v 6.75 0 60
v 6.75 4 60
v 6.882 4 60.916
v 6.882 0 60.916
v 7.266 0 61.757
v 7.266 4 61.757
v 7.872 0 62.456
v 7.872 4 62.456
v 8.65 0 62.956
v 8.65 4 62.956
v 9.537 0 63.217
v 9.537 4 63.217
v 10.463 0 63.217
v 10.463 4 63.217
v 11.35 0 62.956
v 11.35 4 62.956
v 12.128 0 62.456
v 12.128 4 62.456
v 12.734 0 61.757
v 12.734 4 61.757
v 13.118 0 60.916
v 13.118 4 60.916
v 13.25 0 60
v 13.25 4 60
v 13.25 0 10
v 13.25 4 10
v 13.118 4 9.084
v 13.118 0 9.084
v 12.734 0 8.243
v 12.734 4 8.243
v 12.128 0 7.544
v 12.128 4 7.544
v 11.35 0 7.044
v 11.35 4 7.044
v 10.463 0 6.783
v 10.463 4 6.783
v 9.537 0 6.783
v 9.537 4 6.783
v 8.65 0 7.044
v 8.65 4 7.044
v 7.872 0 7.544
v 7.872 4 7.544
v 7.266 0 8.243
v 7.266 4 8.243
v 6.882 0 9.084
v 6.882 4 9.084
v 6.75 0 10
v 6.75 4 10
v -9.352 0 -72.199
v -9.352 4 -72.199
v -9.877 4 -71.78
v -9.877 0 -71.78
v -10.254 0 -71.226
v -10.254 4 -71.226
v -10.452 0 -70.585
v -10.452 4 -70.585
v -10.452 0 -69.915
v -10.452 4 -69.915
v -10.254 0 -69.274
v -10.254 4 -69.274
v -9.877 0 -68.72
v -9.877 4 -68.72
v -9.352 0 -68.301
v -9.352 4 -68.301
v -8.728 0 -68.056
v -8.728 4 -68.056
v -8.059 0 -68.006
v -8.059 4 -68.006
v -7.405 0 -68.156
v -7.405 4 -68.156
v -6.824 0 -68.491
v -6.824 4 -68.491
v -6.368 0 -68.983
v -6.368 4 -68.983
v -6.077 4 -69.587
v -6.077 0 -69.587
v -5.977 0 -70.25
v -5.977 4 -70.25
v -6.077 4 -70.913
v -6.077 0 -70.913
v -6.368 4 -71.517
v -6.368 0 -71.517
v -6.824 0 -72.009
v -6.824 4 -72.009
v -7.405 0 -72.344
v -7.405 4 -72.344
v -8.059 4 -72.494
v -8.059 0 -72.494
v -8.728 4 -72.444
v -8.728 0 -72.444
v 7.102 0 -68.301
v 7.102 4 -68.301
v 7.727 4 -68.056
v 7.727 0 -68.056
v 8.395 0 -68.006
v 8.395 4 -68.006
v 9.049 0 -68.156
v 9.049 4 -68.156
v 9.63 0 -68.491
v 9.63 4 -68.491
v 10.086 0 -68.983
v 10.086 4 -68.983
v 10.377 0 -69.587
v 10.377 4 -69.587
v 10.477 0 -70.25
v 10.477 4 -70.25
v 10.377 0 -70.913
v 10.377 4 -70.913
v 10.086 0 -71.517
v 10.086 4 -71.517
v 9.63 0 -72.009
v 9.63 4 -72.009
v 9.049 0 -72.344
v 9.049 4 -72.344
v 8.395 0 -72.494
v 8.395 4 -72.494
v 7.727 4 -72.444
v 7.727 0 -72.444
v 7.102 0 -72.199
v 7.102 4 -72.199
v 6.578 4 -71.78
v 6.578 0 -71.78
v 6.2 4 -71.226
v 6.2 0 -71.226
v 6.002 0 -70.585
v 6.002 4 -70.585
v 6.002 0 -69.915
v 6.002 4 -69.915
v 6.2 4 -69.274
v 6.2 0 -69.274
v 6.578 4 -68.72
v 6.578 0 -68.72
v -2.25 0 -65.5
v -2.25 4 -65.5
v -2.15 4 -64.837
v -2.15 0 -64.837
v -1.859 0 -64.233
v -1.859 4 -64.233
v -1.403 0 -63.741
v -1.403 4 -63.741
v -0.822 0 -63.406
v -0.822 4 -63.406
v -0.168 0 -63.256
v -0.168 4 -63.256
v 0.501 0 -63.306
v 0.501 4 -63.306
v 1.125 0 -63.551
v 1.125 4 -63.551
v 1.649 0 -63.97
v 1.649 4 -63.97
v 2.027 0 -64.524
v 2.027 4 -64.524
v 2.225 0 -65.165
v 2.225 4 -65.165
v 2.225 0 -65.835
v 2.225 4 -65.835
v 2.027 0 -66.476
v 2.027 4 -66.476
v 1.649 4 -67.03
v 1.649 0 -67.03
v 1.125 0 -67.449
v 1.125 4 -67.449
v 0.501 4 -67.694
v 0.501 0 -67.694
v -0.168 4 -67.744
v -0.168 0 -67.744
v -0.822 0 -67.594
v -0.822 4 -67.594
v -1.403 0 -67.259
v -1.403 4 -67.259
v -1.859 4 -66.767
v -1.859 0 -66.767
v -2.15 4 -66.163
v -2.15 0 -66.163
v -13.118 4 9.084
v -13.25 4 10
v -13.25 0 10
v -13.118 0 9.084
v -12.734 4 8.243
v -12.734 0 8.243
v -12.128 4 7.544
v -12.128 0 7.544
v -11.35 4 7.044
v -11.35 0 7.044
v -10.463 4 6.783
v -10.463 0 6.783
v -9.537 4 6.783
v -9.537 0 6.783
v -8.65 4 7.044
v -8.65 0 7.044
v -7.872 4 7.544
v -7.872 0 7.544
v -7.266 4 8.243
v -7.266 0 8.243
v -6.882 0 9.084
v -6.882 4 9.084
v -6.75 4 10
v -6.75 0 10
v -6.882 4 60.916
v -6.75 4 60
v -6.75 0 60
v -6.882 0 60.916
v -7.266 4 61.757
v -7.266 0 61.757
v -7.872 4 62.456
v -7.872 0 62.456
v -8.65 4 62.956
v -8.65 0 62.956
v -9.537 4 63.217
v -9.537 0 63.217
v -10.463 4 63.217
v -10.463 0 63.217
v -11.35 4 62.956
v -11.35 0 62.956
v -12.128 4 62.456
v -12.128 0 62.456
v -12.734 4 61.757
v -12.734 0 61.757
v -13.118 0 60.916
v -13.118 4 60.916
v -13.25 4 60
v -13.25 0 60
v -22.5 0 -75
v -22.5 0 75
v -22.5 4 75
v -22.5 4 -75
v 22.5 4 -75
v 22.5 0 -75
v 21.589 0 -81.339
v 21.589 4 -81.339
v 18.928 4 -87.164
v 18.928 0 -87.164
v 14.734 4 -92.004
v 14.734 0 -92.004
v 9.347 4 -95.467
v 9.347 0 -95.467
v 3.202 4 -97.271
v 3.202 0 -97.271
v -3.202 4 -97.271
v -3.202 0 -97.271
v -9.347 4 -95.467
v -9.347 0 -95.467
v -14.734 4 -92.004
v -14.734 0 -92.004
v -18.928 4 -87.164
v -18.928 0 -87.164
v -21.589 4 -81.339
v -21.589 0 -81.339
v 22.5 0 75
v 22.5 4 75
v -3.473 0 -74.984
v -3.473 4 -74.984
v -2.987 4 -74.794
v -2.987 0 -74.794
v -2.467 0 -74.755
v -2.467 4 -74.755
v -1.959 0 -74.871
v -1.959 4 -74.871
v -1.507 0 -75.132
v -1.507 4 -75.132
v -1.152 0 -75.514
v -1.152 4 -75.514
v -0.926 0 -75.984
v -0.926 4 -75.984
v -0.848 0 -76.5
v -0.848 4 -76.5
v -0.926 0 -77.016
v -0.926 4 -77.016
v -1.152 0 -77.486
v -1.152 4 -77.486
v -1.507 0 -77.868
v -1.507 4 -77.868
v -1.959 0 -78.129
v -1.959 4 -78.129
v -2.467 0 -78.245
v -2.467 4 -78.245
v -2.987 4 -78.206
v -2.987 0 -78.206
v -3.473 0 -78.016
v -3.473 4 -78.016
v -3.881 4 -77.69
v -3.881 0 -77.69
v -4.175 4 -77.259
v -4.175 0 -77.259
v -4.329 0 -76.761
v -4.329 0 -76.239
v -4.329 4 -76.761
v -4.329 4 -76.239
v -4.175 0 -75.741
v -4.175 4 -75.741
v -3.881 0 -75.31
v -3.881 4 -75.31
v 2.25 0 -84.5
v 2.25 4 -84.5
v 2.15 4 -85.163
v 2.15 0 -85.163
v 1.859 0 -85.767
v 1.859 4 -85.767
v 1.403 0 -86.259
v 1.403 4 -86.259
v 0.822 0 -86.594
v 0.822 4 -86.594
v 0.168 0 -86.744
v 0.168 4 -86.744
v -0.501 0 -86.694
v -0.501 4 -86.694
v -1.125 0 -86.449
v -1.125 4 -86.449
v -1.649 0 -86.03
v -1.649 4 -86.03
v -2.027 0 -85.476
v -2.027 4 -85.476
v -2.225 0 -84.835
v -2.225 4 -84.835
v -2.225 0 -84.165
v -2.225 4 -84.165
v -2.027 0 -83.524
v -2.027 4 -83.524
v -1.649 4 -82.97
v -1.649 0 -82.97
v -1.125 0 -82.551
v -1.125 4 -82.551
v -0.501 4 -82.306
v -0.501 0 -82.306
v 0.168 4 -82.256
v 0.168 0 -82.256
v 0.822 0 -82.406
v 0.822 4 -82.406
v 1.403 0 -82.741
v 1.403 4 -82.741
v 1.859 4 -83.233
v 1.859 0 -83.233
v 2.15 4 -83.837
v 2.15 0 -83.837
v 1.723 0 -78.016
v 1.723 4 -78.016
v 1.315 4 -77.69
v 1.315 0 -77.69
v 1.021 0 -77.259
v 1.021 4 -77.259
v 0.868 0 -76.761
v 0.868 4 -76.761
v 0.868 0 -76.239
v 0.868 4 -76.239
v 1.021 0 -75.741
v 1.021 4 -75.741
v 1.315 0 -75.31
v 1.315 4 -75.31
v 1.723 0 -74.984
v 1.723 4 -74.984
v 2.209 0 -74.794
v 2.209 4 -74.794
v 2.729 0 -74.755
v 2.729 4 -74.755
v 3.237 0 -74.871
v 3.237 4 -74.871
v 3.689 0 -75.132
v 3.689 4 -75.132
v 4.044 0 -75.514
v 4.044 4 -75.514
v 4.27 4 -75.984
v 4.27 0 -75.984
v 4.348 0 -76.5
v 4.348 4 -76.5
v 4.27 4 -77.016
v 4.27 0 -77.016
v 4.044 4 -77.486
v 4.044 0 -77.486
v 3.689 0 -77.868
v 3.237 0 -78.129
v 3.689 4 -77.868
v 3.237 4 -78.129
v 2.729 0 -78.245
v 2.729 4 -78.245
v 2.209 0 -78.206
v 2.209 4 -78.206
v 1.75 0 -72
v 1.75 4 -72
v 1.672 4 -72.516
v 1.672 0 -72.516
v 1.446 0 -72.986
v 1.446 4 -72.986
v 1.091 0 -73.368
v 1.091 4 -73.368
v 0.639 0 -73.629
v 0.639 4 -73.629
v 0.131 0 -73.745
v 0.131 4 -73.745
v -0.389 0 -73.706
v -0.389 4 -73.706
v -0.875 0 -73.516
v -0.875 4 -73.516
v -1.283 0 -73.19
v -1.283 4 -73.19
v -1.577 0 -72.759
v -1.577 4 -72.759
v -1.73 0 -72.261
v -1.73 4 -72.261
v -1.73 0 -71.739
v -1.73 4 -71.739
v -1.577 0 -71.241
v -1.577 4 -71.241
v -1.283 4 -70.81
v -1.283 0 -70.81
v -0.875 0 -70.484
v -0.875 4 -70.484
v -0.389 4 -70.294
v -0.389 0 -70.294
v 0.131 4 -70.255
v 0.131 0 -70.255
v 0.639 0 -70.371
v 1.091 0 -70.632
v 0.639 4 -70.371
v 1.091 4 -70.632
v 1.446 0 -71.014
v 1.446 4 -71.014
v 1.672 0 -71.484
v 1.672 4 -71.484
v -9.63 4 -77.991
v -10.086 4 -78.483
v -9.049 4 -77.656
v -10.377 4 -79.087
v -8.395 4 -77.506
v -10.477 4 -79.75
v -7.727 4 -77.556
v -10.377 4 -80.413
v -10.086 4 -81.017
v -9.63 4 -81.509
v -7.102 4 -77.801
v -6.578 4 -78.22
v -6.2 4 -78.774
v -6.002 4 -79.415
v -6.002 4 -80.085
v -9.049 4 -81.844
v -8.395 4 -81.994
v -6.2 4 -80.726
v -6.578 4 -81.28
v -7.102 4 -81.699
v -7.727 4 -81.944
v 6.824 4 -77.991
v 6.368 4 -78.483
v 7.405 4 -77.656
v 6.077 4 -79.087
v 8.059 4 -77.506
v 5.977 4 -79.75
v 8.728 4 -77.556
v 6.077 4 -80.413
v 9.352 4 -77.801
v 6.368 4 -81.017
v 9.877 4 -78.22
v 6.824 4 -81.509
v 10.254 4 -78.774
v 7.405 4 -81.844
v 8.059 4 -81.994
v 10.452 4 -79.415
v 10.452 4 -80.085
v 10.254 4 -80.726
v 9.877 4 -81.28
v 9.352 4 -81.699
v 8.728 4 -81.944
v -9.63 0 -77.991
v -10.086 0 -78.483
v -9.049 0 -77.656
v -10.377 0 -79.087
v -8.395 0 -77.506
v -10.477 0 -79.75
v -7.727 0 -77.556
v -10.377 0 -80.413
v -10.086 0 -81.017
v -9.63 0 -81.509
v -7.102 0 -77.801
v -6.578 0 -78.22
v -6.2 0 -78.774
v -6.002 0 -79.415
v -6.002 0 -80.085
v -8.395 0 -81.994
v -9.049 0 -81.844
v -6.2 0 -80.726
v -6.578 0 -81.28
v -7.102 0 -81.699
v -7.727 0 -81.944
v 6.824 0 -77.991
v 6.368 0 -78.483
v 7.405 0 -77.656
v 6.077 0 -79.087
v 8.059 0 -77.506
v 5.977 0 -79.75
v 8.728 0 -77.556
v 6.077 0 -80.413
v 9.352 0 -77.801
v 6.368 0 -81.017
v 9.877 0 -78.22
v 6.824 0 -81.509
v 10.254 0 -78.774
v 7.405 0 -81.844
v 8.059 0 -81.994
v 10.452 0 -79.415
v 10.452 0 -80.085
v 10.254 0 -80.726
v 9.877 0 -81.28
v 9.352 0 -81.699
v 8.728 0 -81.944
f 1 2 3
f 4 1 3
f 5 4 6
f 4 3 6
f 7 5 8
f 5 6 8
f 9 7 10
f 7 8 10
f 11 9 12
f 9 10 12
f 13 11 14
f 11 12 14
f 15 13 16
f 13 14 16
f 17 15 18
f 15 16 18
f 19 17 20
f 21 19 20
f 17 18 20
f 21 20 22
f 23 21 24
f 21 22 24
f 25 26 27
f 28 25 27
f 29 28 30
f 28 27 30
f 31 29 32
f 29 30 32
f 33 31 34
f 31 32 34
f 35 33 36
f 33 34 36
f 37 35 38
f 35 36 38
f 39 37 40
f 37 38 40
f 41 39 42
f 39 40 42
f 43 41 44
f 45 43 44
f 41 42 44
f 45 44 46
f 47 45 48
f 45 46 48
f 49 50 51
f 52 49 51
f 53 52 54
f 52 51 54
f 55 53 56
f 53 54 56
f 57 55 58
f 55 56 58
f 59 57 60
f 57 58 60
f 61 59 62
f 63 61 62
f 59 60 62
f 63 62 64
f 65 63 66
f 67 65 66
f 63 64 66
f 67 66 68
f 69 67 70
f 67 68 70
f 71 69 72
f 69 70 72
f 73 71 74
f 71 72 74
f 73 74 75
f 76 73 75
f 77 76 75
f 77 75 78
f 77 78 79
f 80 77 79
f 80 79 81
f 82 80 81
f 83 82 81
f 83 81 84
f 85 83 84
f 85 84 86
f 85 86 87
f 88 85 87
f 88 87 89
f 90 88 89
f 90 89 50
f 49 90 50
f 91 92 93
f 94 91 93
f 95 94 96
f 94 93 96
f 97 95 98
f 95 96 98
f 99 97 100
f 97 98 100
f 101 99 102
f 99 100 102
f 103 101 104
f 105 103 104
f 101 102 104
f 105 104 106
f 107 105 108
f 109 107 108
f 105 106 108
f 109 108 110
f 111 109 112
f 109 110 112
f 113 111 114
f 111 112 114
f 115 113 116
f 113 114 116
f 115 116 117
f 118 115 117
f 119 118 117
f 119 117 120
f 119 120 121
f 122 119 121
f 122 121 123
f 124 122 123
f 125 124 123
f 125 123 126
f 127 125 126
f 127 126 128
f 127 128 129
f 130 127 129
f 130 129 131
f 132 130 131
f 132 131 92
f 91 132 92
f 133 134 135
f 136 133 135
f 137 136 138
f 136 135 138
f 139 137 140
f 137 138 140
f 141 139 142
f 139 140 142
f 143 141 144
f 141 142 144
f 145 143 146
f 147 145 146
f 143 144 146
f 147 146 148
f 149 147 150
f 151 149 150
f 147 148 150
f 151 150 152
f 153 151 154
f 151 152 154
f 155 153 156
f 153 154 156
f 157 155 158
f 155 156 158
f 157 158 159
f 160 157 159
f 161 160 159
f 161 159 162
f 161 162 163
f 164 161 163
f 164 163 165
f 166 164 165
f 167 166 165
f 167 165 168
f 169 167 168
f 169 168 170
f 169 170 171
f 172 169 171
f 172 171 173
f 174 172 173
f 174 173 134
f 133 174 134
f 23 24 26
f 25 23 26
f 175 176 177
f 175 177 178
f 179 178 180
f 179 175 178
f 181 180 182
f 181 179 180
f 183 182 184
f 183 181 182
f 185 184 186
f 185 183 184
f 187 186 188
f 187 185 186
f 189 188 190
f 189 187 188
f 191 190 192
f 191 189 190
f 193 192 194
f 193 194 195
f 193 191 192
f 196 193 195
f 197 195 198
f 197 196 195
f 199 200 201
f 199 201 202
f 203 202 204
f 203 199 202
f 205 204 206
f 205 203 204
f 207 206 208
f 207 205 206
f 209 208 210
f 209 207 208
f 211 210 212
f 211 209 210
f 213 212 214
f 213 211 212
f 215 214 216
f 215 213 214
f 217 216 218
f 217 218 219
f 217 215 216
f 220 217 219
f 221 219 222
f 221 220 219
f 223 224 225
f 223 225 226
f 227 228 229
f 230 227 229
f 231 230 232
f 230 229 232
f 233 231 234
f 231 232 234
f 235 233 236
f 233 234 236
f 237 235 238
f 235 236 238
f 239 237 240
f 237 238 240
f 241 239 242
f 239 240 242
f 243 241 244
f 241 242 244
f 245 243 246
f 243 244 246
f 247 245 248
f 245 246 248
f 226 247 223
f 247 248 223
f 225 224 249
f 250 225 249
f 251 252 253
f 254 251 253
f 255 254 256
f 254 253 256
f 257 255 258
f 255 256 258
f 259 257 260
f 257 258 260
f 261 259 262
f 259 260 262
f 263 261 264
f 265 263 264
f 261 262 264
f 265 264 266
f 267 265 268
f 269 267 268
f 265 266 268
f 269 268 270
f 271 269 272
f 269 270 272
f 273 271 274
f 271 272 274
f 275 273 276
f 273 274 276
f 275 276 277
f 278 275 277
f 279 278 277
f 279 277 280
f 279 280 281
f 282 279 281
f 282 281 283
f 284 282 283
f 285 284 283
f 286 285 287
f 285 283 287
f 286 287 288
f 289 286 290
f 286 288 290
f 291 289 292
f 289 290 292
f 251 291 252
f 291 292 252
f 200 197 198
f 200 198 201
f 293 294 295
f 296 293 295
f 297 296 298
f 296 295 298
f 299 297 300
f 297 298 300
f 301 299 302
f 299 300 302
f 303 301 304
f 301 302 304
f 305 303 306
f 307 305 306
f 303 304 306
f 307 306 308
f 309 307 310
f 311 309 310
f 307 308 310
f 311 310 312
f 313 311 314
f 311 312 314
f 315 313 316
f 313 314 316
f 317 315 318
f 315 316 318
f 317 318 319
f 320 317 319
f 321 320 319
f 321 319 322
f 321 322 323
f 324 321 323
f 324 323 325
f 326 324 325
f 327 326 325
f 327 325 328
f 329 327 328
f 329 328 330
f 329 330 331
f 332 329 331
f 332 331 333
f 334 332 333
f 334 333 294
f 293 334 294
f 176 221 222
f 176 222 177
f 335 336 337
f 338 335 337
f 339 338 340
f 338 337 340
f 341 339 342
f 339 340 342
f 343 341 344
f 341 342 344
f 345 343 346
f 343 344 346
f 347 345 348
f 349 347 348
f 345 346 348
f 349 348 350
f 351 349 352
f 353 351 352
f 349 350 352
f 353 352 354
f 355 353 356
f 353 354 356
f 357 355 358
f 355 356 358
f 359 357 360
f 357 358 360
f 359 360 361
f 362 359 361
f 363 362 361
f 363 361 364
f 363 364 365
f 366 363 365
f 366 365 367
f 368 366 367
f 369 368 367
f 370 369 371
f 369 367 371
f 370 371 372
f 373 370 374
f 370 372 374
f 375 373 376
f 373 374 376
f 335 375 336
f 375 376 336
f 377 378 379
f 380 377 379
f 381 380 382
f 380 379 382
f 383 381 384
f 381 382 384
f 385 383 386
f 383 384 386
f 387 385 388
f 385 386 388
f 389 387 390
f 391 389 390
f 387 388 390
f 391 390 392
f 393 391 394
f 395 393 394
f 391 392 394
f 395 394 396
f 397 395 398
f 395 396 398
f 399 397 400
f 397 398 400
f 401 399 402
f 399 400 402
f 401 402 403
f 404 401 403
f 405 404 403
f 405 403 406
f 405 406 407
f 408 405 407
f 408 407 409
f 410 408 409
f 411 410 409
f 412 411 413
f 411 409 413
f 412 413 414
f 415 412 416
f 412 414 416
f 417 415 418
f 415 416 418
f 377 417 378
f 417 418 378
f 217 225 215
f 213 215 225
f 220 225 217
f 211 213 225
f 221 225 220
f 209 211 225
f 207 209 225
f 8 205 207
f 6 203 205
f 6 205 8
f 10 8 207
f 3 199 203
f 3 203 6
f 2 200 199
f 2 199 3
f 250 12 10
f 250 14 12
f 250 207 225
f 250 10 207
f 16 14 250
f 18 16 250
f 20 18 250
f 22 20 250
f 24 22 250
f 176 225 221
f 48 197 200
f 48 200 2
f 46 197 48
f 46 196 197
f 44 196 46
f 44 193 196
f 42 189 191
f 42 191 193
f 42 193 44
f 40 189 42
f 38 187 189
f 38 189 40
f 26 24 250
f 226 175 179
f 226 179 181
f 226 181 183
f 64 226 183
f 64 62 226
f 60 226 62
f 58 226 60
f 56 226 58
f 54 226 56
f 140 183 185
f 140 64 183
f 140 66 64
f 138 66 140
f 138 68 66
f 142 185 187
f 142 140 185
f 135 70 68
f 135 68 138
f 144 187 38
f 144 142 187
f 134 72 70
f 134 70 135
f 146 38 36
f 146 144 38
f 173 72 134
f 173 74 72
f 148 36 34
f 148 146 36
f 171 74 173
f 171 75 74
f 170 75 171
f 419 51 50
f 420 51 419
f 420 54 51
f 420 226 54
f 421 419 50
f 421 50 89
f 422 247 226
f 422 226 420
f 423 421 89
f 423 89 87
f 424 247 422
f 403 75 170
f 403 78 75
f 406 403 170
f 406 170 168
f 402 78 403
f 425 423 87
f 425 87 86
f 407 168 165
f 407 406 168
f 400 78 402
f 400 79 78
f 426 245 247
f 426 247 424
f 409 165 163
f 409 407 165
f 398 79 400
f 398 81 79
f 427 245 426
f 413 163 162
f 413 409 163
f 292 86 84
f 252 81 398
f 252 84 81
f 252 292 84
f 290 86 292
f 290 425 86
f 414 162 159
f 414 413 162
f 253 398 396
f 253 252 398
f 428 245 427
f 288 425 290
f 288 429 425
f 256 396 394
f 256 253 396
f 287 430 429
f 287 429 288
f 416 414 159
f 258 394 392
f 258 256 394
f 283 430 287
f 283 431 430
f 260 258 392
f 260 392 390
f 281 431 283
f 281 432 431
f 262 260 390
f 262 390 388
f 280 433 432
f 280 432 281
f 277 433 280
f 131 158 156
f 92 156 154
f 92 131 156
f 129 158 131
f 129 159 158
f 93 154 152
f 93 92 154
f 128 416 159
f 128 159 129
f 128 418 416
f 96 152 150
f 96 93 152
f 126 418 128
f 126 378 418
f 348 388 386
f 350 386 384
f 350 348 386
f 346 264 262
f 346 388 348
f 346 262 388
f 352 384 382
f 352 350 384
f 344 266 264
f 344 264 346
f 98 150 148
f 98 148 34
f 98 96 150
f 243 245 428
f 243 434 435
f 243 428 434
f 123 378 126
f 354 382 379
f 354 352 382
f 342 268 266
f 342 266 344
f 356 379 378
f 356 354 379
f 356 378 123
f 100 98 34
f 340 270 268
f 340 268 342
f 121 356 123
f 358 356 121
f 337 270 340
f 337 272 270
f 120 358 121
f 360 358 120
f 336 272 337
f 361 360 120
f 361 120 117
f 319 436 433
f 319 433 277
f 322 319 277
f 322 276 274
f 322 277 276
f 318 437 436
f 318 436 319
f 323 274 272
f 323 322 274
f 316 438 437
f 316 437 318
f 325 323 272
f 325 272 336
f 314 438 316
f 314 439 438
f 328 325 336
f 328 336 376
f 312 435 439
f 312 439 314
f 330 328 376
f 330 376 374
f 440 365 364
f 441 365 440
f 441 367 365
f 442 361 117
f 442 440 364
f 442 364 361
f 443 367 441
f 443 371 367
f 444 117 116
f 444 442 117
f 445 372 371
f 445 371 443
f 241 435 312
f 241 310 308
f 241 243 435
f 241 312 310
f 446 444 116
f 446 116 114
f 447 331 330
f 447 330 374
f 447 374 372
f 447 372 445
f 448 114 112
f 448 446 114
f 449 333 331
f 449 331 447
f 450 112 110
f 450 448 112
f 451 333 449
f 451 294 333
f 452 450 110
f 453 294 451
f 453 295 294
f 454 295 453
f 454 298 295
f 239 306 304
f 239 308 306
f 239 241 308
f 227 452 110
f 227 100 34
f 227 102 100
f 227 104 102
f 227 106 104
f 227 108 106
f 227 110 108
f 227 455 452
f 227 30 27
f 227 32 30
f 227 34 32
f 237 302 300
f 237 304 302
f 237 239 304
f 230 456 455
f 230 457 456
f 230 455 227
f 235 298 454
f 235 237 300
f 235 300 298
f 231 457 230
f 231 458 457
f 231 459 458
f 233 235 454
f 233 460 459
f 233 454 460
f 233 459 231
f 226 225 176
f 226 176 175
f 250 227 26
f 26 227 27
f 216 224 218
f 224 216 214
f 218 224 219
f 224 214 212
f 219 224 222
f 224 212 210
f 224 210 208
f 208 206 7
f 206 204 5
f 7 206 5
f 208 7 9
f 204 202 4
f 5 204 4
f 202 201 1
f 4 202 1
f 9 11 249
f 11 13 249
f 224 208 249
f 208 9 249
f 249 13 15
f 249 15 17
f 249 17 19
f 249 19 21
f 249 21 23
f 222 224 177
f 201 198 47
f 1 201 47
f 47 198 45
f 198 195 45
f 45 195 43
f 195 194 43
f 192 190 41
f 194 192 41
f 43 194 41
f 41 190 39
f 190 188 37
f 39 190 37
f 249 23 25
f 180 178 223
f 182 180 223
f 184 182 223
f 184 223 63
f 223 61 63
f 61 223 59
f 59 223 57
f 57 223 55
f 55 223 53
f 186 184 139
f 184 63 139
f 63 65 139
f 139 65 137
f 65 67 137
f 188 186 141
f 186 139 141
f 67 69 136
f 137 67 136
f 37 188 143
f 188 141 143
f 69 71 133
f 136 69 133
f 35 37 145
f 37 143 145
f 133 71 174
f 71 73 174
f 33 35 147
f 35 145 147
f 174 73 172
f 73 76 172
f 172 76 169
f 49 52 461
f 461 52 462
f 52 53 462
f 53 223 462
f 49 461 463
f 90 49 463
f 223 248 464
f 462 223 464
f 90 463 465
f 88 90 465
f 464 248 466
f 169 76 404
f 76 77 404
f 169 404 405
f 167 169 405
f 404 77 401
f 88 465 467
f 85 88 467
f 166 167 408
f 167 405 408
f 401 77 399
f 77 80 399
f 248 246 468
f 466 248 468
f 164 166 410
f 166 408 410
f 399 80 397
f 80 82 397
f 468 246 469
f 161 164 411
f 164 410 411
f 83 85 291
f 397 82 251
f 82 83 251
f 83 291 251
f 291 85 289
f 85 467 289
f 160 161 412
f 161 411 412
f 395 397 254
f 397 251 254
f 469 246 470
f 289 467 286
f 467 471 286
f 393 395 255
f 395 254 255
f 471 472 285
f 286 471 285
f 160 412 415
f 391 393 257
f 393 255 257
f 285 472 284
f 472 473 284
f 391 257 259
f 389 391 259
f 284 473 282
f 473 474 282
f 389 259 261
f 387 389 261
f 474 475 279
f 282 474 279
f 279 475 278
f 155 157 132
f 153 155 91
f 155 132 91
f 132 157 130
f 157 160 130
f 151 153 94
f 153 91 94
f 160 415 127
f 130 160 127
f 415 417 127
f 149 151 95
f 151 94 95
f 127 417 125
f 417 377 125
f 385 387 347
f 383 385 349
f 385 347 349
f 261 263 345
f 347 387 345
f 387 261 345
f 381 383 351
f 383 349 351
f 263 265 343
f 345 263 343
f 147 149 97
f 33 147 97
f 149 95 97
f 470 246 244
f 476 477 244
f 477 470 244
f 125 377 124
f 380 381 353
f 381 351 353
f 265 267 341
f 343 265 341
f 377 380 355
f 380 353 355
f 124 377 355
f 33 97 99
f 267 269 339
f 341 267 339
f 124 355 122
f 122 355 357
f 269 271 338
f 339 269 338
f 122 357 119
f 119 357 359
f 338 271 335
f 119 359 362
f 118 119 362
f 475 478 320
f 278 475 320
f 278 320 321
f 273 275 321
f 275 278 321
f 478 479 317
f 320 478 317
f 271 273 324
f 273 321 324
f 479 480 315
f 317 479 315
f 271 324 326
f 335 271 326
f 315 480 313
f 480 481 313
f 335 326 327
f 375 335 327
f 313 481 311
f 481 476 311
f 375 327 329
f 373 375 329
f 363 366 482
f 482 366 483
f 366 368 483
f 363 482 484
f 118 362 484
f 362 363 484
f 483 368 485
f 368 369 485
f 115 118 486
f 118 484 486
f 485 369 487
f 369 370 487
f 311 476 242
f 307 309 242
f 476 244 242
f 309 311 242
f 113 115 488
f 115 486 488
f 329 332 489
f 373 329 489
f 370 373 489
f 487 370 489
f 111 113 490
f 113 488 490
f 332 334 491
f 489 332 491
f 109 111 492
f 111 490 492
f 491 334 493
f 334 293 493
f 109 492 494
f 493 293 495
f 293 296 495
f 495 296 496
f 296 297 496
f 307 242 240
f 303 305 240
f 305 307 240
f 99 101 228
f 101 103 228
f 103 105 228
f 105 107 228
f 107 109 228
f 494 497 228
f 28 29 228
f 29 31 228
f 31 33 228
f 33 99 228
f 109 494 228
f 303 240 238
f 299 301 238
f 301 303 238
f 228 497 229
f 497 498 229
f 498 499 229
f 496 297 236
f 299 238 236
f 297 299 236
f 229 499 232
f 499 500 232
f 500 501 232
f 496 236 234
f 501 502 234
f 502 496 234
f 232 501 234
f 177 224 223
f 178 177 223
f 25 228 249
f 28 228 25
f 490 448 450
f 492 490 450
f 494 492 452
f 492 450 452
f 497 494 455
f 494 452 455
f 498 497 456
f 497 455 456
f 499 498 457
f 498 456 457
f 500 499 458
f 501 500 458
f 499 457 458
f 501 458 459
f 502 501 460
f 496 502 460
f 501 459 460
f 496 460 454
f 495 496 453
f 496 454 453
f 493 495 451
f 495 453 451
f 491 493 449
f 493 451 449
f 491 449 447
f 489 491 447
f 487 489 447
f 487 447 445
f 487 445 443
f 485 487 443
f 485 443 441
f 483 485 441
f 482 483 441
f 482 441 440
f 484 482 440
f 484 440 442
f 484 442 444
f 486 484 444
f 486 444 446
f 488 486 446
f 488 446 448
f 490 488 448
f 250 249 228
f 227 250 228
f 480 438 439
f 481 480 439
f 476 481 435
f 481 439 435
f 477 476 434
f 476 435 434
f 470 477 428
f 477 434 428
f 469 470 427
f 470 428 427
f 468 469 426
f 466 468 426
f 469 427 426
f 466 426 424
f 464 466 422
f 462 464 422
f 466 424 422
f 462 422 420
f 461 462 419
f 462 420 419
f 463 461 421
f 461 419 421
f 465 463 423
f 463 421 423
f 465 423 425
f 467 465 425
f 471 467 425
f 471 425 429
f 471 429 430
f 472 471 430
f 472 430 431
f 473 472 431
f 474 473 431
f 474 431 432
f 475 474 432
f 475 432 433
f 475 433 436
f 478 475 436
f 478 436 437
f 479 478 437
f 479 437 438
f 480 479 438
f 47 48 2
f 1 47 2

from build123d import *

# Parameters (mm, degrees)
SKETCH1_W           = 45
SKETCH1_H           = 150
BOSS_EXTRUDE1_DEPTH = 4
SKETCH2_R           = 22.5
BOSS_EXTRUDE2_DEPTH = 4
SKETCH3_R           = 2.25
CUT_EXTRUDE1_DEPTH  = 5
CIRPATTERN1_COUNT   = 6
SKETCH4_R           = 1.75
CUT_EXTRUDE2_DEPTH  = 4
CIRPATTERN2_COUNT   = 3
CUT_EXTRUDE3_DEPTH  = 4


with BuildPart() as part:
    # Sketch1 → Boss-Extrude1 (new body)
    with BuildSketch(Plane(origin=(0, 0, 0), x_dir=(1, 0, 0), z_dir=(0, 1, 0))):
        Rectangle(SKETCH1_W, SKETCH1_H)
    extrude(amount=BOSS_EXTRUDE1_DEPTH)

    # Sketch2 → Boss-Extrude2 (add)
    with BuildSketch(Plane(origin=(0, 0, 0), x_dir=(1, 0, 0), z_dir=(0, 1, 0))):
        with Locations((0, 75)):
            Circle(SKETCH2_R)
    extrude(amount=BOSS_EXTRUDE2_DEPTH)

    # Sketch3 → Cut-Extrude1 (cut, through all)
    with BuildSketch(Plane(origin=(0, 4, 0), x_dir=(1, 0, 0), z_dir=(0, 1, 0))):
        with Locations((0, 84.5)):
            Circle(SKETCH3_R)
    cut_extrude1 = extrude(amount=-CUT_EXTRUDE1_DEPTH, mode=Mode.SUBTRACT)

    # CirPattern1: Cut-Extrude1 ×6 about axis
    cirpattern1_axis = Axis((0, 0, -75), (0, 1, 0))
    for i in range(1, CIRPATTERN1_COUNT):
        add(cut_extrude1.rotate(cirpattern1_axis, i * 360 / CIRPATTERN1_COUNT), mode=Mode.SUBTRACT)

    # Sketch4 → Cut-Extrude2 (cut)
    with BuildSketch(Plane(origin=(0, 4, 0), x_dir=(1, 0, 0), z_dir=(0, 1, 0))):
        with Locations((0, 72)):
            Circle(SKETCH4_R)
    cut_extrude2 = extrude(amount=-CUT_EXTRUDE2_DEPTH, mode=Mode.SUBTRACT)

    # CirPattern2: Cut-Extrude2 ×3 about axis
    cirpattern2_axis = Axis((0, 0, -75), (0, 1, 0))
    for i in range(1, CIRPATTERN2_COUNT):
        add(cut_extrude2.rotate(cirpattern2_axis, i * 360 / CIRPATTERN2_COUNT), mode=Mode.SUBTRACT)

    # Sketch5 → Cut-Extrude3 (cut)
    with BuildSketch(Plane(origin=(0, 4, 0), x_dir=(1, 0, 0), z_dir=(0, 1, 0))):
        with BuildLine():
            Line((-6.75, -10), (-6.75, -60))
            ThreePointArc((-6.75, -60), (-10, -63.25), (-13.25, -60))
            Line((-13.25, -60), (-13.25, -10))
            ThreePointArc((-13.25, -10), (-10, -6.75), (-6.75, -10))
        make_face()
    cut_extrude3 = extrude(amount=-CUT_EXTRUDE3_DEPTH, mode=Mode.SUBTRACT)

    # Mirror1: Cut-Extrude3 across plane
    add(cut_extrude3.mirror(Plane(origin=(0, 0, 0), x_dir=(0, 0, 1), z_dir=(1, 0, 0))), mode=Mode.SUBTRACT)


solid = part.part
